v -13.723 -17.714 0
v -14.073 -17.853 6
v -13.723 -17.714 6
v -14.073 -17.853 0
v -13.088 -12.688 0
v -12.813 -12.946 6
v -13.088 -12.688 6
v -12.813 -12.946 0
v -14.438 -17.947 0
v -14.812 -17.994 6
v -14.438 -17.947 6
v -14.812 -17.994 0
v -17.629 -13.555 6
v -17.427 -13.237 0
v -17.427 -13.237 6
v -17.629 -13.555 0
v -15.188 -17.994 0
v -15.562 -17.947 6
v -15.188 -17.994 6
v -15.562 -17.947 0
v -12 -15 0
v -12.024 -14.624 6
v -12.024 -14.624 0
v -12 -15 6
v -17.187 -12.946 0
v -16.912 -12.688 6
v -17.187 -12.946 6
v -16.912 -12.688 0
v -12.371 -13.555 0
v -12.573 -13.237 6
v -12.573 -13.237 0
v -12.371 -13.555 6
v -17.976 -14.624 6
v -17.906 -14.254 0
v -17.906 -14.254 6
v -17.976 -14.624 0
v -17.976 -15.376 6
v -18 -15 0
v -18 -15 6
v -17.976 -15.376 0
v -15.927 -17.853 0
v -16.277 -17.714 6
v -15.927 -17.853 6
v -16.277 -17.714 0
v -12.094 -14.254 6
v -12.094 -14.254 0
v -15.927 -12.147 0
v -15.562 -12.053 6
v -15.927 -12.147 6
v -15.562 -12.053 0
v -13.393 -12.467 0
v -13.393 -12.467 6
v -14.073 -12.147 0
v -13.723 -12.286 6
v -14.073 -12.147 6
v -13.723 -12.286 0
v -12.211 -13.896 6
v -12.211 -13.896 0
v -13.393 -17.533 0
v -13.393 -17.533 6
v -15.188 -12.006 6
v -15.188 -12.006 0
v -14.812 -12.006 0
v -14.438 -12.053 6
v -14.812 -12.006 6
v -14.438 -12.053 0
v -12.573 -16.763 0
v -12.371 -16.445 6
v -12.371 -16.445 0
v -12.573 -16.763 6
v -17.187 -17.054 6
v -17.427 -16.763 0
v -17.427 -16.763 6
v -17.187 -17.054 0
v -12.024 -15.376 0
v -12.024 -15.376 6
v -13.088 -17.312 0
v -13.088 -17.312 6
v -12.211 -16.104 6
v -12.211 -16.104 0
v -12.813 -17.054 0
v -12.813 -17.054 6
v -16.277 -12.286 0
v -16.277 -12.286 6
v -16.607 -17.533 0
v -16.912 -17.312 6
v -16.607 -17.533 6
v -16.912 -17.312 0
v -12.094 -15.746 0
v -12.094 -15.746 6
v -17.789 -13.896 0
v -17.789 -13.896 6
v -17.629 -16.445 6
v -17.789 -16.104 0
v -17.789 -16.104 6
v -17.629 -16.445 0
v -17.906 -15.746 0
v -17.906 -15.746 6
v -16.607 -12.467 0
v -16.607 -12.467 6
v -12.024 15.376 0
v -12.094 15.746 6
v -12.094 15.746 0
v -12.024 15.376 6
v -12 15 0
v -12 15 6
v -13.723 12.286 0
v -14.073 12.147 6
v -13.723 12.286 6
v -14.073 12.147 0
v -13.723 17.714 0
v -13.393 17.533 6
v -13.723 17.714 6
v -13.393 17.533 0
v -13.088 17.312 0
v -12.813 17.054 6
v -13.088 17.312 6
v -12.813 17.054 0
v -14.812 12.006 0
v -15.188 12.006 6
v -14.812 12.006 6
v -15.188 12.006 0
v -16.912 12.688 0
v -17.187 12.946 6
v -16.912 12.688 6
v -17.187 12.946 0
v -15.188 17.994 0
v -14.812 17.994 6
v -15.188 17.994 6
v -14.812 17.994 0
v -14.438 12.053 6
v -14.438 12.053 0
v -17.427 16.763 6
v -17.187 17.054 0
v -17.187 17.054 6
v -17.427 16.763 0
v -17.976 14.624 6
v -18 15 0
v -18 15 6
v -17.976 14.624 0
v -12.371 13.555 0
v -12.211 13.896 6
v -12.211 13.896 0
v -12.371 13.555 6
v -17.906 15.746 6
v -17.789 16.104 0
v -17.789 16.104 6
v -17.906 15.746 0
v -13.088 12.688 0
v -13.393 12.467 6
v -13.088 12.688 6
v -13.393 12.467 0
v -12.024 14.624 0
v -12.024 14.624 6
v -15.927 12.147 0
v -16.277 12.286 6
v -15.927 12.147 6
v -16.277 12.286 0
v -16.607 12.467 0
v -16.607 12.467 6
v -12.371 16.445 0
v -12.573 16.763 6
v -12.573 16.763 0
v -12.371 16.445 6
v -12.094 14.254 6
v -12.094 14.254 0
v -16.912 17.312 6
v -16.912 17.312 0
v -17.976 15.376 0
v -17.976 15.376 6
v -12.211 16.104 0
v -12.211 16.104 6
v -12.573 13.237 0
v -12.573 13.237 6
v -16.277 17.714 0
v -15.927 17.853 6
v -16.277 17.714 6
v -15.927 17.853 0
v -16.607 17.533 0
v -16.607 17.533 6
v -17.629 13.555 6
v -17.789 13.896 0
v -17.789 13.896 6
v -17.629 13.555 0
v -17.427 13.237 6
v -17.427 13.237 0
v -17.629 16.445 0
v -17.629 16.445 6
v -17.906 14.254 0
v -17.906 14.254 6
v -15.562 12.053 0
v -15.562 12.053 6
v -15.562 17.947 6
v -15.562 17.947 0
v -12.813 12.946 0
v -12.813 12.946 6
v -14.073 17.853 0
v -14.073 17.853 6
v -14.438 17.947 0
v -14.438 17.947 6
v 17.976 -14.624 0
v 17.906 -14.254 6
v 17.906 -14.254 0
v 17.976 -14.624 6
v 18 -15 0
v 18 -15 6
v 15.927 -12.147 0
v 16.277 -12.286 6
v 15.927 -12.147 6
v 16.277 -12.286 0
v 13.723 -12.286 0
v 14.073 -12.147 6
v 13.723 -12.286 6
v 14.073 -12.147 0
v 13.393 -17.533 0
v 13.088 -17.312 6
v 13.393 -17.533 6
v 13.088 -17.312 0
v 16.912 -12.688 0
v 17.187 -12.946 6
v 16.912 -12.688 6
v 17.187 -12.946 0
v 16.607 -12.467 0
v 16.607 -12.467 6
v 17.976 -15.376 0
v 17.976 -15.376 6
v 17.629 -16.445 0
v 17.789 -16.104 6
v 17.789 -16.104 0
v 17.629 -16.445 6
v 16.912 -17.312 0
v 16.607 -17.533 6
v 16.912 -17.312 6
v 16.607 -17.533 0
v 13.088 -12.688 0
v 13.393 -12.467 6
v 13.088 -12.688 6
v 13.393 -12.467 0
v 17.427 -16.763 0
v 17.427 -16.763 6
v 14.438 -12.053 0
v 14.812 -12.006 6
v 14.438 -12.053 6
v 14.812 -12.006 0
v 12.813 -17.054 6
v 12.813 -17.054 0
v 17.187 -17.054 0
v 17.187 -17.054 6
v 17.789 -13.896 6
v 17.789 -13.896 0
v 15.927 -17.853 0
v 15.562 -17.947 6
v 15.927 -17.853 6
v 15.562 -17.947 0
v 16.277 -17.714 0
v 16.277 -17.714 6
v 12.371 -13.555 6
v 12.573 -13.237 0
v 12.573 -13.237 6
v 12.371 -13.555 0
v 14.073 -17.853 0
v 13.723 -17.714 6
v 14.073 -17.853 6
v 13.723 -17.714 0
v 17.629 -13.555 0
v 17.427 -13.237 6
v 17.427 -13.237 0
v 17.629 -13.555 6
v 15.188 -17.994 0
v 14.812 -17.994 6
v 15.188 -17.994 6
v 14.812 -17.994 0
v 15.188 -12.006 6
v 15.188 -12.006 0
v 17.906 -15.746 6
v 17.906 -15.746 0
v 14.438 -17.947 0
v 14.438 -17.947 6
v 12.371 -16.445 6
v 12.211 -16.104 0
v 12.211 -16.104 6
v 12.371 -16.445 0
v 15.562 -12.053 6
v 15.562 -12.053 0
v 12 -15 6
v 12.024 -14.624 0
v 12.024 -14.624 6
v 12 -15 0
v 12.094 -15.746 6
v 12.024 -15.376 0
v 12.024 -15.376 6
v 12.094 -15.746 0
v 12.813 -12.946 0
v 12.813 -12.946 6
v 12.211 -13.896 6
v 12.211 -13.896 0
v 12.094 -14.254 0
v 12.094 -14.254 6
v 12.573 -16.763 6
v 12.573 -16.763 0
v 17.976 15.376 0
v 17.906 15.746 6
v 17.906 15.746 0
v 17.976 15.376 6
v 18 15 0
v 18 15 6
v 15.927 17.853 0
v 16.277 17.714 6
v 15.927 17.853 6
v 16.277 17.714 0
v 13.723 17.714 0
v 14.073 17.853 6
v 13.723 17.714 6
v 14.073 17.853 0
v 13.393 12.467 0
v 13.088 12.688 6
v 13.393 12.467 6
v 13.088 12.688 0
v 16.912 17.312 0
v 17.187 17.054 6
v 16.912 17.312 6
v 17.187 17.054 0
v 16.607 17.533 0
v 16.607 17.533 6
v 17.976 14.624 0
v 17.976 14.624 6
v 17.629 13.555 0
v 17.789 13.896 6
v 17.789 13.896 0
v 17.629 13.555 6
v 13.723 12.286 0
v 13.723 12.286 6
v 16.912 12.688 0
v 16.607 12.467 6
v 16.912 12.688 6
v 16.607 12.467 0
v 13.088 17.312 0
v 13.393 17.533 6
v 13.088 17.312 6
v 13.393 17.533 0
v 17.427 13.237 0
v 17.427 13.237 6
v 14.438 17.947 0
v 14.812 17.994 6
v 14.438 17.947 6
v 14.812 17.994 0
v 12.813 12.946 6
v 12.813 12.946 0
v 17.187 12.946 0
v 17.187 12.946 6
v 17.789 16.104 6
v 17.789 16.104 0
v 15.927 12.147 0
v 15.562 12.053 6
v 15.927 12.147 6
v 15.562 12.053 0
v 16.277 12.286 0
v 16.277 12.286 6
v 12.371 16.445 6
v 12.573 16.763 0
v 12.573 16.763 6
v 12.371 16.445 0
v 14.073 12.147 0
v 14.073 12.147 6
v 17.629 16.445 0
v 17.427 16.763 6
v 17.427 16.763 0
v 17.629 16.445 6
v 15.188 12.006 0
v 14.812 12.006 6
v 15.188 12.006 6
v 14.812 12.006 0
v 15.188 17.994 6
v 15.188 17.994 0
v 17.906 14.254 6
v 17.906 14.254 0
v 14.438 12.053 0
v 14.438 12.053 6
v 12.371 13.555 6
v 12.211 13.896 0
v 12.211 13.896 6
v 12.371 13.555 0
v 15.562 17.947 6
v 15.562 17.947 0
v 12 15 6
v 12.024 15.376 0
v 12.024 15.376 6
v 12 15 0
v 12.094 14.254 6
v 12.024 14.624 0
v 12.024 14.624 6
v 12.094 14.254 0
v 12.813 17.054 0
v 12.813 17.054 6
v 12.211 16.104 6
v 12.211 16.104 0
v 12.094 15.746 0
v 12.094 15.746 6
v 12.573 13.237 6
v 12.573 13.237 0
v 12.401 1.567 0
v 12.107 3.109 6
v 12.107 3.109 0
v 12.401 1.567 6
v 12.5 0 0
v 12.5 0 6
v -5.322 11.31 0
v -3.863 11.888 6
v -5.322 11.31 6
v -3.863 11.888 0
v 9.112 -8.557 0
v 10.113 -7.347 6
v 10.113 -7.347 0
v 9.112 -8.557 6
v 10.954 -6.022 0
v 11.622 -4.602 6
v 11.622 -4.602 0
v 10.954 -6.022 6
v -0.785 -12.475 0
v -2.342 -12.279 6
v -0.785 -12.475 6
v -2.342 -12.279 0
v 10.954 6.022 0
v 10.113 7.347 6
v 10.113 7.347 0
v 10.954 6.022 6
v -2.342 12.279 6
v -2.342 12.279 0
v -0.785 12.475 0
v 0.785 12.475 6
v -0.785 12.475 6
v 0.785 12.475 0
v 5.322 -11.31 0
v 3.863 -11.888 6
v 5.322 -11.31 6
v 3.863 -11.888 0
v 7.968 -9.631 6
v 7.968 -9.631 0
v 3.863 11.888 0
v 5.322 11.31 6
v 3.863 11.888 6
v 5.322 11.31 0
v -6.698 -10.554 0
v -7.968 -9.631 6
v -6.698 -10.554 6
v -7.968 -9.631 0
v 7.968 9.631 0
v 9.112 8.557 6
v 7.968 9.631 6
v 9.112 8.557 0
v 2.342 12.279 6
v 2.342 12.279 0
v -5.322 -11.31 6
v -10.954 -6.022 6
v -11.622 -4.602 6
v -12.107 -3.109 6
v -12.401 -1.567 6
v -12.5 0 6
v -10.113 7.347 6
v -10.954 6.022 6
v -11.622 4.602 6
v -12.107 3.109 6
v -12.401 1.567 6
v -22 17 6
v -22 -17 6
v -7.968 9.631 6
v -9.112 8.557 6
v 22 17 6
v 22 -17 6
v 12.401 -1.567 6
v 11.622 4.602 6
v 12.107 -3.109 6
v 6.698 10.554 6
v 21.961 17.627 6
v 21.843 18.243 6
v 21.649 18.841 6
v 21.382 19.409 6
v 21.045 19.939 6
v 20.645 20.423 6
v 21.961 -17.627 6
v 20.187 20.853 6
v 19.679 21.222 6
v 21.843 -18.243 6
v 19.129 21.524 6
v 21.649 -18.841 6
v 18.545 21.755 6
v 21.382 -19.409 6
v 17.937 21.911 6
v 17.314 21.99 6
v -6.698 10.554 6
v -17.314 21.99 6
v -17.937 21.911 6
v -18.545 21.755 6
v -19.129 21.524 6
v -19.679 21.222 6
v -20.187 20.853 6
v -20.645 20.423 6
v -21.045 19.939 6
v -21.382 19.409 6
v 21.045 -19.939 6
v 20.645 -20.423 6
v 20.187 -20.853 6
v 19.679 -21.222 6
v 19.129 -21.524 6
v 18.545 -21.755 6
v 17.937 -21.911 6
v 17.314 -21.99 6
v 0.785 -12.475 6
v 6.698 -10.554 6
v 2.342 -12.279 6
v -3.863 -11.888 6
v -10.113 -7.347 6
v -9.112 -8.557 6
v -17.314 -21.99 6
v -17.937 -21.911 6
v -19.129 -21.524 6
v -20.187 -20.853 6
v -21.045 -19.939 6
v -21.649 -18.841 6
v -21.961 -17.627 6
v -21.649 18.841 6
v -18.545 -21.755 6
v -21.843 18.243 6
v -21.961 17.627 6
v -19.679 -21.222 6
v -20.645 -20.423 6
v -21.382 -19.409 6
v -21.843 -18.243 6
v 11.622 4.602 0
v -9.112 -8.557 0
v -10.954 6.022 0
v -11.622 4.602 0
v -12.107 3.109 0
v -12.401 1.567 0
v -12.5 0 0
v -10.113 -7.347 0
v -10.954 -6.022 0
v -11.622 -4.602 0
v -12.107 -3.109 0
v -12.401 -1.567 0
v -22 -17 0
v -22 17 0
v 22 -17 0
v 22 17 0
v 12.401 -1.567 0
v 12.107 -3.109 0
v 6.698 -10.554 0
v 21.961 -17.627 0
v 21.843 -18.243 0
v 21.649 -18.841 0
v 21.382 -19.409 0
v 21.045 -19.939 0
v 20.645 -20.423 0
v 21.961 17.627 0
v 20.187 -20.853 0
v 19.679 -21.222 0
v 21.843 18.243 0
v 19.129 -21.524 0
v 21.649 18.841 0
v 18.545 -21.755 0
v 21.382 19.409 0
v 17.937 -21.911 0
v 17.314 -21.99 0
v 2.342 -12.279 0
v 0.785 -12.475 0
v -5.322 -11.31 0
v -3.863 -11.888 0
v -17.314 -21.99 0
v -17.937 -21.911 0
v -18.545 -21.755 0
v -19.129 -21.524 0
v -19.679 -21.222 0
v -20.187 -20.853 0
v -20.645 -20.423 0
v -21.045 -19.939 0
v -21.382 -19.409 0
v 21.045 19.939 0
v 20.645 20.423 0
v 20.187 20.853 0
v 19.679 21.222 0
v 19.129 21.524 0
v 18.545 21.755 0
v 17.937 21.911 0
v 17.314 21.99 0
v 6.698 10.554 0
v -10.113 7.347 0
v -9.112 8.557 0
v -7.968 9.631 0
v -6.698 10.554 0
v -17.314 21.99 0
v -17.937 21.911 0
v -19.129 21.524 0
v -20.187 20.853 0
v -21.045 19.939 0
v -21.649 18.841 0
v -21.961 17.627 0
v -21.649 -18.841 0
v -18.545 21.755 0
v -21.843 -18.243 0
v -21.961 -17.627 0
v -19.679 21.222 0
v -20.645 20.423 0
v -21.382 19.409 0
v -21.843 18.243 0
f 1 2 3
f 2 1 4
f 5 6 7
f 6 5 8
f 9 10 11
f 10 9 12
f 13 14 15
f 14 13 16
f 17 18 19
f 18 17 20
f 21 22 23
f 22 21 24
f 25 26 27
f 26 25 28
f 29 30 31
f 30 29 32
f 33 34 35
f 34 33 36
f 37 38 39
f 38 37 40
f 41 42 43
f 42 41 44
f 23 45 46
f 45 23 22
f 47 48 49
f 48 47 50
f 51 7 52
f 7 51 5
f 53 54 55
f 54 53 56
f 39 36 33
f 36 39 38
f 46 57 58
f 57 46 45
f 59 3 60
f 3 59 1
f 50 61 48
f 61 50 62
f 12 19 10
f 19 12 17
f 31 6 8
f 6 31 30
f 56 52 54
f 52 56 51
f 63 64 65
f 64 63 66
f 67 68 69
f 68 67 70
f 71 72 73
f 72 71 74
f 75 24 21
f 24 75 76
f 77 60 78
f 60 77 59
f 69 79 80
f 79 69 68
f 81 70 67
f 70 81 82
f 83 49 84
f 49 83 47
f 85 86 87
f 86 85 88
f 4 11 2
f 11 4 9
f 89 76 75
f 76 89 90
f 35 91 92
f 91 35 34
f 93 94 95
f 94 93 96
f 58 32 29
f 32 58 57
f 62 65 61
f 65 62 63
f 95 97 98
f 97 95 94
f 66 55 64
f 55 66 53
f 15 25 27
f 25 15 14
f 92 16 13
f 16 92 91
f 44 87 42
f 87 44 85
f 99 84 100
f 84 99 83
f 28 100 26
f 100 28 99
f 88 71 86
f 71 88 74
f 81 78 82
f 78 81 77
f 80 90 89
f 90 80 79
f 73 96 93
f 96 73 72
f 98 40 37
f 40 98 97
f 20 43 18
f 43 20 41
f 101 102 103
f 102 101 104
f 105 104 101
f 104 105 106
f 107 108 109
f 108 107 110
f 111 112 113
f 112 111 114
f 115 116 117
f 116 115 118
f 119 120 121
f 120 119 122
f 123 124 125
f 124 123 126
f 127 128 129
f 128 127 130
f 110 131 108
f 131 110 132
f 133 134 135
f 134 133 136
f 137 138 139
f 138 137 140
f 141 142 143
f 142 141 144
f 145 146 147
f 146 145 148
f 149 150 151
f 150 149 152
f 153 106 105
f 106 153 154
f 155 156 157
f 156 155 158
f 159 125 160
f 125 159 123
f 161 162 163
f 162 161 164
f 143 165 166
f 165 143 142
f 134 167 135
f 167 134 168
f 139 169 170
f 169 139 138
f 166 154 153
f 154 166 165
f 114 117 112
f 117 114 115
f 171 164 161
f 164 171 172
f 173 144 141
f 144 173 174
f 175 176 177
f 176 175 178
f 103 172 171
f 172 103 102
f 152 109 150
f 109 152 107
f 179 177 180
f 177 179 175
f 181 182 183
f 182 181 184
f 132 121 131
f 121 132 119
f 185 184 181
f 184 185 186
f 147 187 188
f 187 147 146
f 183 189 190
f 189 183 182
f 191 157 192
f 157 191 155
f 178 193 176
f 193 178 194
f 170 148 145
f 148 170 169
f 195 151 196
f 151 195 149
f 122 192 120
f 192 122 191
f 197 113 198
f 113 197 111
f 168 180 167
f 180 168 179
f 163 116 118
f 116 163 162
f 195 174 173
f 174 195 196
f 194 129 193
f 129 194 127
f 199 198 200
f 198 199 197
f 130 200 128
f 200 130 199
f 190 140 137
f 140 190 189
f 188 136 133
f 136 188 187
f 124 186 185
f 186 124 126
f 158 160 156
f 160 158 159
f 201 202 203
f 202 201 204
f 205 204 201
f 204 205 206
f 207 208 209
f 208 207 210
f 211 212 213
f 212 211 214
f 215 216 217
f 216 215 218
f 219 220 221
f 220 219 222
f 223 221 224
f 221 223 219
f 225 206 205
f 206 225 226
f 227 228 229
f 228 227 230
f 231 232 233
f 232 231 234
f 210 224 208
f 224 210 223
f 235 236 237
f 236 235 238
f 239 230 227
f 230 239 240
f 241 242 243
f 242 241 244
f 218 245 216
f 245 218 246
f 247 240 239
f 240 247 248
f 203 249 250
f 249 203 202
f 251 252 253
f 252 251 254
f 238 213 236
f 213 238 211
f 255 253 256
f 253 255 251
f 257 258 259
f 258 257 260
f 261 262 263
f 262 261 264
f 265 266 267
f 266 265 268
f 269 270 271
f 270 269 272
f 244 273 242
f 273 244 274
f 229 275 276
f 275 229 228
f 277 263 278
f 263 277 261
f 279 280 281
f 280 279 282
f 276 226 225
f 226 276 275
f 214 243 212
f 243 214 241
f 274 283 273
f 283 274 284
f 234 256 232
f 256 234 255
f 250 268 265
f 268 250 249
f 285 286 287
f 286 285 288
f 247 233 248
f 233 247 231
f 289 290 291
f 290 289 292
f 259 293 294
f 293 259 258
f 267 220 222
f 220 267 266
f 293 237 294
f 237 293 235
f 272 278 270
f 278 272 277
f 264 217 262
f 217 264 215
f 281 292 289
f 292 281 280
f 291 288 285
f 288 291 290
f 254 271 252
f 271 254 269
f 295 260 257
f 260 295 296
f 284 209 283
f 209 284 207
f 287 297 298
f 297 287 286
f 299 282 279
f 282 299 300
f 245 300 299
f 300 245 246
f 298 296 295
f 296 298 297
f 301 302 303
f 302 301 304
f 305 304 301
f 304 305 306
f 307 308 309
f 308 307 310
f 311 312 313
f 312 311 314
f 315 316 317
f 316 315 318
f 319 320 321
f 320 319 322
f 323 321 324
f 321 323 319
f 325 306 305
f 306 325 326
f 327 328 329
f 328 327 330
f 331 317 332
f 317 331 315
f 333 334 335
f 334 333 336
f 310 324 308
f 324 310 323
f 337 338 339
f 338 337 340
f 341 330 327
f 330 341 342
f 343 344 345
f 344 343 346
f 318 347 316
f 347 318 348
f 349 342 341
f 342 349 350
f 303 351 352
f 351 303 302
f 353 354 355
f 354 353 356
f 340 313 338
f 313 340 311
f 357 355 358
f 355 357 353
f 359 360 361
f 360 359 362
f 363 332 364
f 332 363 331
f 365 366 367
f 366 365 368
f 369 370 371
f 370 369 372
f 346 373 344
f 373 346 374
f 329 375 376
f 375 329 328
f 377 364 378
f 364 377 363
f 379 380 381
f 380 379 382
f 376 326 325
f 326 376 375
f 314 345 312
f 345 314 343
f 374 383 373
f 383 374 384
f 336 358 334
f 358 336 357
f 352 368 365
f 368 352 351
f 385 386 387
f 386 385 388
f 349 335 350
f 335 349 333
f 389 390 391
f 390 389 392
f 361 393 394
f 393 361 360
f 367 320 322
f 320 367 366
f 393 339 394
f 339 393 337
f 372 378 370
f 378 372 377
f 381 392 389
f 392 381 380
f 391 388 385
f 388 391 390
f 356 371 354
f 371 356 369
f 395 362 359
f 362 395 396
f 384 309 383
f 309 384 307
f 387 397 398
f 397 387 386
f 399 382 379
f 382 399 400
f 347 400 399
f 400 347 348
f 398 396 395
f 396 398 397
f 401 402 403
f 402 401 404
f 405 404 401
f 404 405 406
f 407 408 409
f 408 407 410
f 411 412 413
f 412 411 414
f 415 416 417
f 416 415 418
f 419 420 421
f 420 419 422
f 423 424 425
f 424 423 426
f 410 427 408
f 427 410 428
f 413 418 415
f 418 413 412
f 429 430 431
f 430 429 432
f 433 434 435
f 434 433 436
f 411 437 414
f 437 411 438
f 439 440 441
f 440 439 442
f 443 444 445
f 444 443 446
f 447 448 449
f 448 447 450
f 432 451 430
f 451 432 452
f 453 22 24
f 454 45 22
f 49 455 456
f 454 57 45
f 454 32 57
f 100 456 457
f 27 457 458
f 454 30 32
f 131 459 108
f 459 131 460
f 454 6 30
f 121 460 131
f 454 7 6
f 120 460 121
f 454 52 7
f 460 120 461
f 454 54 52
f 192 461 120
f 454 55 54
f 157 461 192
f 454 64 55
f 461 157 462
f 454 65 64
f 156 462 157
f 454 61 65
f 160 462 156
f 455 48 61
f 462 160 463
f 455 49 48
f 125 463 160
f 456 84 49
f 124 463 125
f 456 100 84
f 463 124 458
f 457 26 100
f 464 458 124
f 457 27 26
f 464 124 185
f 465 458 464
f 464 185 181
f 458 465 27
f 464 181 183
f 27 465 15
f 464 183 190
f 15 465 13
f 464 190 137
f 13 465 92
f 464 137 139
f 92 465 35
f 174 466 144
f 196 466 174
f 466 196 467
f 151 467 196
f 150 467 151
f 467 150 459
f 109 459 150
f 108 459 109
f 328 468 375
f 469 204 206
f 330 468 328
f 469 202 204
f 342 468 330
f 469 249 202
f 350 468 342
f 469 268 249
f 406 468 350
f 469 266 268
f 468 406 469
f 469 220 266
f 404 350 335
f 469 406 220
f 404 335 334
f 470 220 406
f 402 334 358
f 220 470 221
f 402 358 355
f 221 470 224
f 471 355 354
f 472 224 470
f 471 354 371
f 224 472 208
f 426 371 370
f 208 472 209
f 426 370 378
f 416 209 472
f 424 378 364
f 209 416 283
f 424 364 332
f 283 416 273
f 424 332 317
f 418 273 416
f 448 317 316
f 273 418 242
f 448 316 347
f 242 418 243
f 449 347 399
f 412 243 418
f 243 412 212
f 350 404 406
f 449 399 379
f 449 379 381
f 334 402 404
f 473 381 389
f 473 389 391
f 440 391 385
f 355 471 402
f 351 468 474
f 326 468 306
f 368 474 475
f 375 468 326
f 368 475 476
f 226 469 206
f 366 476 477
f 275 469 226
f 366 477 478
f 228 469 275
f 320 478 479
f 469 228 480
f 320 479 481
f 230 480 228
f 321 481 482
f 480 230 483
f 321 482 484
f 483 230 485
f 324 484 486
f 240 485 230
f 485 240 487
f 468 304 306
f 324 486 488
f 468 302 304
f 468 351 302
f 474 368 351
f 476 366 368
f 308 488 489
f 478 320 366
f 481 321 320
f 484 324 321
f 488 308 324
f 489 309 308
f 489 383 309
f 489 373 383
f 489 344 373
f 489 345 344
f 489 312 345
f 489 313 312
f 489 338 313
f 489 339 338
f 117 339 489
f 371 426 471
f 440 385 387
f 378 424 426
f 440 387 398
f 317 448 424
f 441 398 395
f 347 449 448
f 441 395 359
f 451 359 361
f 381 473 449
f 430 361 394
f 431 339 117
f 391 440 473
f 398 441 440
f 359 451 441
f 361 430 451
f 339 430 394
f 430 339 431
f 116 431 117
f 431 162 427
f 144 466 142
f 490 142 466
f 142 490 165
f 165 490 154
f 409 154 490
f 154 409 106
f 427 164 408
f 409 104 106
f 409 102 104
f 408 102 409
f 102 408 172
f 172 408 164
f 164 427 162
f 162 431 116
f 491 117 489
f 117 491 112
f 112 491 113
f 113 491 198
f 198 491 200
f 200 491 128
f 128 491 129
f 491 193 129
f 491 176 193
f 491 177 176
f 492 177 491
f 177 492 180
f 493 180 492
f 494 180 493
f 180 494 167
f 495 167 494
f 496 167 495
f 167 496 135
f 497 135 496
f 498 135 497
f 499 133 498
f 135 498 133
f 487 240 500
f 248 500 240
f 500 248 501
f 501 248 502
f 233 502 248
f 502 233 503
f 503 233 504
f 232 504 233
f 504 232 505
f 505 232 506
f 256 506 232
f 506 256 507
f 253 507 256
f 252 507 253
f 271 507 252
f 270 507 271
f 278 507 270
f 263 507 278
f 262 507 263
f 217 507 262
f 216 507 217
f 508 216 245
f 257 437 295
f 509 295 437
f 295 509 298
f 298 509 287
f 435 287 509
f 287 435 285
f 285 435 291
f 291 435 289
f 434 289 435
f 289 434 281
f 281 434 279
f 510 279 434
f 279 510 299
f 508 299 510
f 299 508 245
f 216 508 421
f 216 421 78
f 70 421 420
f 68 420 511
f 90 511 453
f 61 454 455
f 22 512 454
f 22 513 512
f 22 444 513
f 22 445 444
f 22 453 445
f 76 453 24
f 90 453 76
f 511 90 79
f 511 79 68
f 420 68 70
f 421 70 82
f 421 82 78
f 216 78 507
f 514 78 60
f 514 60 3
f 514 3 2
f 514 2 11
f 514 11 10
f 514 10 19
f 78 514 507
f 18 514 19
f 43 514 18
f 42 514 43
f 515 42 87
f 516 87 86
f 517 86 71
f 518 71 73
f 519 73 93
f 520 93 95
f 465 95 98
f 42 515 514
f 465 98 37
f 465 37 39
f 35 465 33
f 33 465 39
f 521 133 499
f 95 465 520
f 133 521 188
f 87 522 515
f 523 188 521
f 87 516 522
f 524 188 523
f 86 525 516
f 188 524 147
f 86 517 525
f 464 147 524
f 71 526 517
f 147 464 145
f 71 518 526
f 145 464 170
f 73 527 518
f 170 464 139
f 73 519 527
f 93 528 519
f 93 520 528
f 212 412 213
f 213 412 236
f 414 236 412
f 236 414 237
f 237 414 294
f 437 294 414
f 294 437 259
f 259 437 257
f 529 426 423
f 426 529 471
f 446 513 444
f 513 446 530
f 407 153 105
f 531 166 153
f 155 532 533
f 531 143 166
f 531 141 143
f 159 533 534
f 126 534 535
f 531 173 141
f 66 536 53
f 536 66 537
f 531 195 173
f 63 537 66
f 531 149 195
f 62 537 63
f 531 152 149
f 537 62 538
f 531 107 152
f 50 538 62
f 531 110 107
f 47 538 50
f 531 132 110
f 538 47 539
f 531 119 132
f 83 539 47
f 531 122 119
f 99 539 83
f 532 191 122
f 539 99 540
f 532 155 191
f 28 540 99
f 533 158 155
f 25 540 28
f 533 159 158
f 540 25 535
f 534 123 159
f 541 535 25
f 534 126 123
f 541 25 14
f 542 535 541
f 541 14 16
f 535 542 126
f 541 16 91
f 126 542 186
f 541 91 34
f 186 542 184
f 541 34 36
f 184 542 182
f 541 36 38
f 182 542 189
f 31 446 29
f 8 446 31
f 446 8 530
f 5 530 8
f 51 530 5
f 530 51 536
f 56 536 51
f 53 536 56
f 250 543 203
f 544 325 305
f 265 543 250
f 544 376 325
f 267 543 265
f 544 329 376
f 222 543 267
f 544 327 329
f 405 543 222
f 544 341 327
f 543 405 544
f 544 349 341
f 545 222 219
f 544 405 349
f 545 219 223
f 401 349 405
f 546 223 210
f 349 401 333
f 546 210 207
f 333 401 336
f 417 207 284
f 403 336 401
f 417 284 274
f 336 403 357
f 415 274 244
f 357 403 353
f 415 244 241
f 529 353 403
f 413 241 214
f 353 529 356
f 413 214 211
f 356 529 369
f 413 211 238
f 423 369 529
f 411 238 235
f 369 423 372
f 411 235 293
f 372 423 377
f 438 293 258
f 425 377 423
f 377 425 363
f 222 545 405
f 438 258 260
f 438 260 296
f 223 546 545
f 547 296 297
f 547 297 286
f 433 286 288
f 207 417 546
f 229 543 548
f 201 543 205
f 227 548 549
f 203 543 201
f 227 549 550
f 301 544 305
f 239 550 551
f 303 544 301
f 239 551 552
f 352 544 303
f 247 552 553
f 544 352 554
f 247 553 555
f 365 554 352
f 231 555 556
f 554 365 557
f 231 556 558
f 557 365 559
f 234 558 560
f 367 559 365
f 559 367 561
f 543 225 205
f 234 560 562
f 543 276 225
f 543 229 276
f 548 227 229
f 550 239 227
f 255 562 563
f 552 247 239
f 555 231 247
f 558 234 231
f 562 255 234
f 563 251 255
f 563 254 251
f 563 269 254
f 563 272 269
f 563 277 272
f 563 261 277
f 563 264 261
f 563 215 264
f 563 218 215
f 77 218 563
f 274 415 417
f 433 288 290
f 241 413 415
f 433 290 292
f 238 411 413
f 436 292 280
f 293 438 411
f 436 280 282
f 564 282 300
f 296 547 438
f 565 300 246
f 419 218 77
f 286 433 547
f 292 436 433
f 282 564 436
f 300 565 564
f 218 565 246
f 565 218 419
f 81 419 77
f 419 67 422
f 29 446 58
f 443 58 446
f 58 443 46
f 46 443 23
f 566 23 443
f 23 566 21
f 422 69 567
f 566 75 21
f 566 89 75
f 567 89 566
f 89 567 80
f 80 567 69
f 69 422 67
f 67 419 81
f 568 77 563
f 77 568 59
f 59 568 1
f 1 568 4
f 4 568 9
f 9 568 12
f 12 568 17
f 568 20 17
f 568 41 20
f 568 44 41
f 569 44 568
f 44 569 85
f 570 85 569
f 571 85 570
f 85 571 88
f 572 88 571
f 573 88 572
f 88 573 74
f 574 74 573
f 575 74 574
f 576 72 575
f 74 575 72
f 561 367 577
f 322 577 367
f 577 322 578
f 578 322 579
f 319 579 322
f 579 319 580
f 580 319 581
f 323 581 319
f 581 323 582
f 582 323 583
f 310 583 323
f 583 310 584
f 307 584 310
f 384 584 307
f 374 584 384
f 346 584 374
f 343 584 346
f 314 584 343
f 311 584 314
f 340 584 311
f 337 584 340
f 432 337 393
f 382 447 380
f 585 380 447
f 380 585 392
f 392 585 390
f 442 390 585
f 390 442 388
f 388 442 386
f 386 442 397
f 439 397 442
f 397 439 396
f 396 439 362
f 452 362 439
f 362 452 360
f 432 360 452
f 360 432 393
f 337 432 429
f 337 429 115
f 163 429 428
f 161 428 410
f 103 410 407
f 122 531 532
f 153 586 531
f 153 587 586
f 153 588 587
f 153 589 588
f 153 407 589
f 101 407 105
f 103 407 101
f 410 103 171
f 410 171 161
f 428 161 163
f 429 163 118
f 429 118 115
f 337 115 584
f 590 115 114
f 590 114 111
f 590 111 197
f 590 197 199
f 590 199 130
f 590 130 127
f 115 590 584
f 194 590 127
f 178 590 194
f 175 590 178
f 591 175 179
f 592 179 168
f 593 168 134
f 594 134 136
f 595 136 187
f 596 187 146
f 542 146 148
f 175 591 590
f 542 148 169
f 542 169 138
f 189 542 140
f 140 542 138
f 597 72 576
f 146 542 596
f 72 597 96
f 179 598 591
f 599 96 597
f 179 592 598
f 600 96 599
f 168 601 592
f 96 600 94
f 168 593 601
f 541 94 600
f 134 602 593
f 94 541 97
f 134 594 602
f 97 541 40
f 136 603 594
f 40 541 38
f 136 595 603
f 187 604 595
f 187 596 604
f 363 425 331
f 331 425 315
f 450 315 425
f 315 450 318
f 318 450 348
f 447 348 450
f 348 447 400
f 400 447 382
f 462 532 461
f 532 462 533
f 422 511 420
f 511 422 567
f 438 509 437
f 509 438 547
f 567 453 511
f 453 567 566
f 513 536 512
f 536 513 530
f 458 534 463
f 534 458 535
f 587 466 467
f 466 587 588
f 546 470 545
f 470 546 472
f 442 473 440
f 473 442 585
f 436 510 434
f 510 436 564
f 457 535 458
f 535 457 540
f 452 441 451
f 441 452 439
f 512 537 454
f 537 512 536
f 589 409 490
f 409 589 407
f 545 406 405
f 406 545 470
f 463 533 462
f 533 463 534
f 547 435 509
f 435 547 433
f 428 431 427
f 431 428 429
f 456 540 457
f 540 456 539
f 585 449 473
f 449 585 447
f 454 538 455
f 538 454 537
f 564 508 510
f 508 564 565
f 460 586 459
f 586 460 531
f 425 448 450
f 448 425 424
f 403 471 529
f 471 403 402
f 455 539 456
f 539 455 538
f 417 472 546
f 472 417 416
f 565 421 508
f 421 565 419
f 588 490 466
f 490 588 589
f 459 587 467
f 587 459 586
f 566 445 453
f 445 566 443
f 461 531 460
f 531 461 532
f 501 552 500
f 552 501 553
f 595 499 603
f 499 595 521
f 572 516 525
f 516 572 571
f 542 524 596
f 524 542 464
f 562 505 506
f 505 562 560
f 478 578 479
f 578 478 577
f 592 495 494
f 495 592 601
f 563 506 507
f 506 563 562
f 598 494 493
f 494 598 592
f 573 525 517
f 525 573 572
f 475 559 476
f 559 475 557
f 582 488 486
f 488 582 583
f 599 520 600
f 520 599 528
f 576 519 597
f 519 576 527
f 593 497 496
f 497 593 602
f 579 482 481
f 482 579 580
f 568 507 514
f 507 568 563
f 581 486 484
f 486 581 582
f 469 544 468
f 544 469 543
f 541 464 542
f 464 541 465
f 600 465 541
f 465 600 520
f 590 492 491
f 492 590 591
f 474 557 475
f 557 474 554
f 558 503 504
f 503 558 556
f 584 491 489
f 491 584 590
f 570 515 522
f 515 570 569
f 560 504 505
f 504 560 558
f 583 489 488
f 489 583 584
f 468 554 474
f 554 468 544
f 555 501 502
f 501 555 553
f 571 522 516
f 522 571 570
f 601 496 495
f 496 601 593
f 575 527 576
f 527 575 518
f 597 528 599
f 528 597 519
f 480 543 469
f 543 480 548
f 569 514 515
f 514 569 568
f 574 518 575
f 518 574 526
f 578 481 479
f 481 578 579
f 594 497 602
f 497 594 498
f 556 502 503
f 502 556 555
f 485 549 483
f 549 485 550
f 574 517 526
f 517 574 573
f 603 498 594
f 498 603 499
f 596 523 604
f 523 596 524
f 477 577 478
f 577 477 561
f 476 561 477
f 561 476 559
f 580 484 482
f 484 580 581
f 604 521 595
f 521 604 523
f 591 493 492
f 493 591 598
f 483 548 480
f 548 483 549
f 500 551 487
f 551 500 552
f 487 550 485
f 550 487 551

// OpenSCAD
$fn = 50;


difference() {
	union() {
		hull() {
			translate(v = [-17.0000000000, 17.0000000000, 0]) {
				cylinder(h = 6, r = 5);
			}
			translate(v = [17.0000000000, 17.0000000000, 0]) {
				cylinder(h = 6, r = 5);
			}
			translate(v = [-17.0000000000, -17.0000000000, 0]) {
				cylinder(h = 6, r = 5);
			}
			translate(v = [17.0000000000, -17.0000000000, 0]) {
				cylinder(h = 6, r = 5);
			}
		}
	}
	union() {
		#translate(v = [-15.0000000000, -15.0000000000, -100.0000000000]) {
			cylinder(h = 200, r = 3.0000000000);
		}
		#translate(v = [-15.0000000000, 15.0000000000, -100.0000000000]) {
			cylinder(h = 200, r = 3.0000000000);
		}
		#translate(v = [15.0000000000, -15.0000000000, -100.0000000000]) {
			cylinder(h = 200, r = 3.0000000000);
		}
		#translate(v = [15.0000000000, 15.0000000000, -100.0000000000]) {
			cylinder(h = 200, r = 3.0000000000);
		}
		#cylinder(h = 6, r = 12.5000000000);
	}
}
